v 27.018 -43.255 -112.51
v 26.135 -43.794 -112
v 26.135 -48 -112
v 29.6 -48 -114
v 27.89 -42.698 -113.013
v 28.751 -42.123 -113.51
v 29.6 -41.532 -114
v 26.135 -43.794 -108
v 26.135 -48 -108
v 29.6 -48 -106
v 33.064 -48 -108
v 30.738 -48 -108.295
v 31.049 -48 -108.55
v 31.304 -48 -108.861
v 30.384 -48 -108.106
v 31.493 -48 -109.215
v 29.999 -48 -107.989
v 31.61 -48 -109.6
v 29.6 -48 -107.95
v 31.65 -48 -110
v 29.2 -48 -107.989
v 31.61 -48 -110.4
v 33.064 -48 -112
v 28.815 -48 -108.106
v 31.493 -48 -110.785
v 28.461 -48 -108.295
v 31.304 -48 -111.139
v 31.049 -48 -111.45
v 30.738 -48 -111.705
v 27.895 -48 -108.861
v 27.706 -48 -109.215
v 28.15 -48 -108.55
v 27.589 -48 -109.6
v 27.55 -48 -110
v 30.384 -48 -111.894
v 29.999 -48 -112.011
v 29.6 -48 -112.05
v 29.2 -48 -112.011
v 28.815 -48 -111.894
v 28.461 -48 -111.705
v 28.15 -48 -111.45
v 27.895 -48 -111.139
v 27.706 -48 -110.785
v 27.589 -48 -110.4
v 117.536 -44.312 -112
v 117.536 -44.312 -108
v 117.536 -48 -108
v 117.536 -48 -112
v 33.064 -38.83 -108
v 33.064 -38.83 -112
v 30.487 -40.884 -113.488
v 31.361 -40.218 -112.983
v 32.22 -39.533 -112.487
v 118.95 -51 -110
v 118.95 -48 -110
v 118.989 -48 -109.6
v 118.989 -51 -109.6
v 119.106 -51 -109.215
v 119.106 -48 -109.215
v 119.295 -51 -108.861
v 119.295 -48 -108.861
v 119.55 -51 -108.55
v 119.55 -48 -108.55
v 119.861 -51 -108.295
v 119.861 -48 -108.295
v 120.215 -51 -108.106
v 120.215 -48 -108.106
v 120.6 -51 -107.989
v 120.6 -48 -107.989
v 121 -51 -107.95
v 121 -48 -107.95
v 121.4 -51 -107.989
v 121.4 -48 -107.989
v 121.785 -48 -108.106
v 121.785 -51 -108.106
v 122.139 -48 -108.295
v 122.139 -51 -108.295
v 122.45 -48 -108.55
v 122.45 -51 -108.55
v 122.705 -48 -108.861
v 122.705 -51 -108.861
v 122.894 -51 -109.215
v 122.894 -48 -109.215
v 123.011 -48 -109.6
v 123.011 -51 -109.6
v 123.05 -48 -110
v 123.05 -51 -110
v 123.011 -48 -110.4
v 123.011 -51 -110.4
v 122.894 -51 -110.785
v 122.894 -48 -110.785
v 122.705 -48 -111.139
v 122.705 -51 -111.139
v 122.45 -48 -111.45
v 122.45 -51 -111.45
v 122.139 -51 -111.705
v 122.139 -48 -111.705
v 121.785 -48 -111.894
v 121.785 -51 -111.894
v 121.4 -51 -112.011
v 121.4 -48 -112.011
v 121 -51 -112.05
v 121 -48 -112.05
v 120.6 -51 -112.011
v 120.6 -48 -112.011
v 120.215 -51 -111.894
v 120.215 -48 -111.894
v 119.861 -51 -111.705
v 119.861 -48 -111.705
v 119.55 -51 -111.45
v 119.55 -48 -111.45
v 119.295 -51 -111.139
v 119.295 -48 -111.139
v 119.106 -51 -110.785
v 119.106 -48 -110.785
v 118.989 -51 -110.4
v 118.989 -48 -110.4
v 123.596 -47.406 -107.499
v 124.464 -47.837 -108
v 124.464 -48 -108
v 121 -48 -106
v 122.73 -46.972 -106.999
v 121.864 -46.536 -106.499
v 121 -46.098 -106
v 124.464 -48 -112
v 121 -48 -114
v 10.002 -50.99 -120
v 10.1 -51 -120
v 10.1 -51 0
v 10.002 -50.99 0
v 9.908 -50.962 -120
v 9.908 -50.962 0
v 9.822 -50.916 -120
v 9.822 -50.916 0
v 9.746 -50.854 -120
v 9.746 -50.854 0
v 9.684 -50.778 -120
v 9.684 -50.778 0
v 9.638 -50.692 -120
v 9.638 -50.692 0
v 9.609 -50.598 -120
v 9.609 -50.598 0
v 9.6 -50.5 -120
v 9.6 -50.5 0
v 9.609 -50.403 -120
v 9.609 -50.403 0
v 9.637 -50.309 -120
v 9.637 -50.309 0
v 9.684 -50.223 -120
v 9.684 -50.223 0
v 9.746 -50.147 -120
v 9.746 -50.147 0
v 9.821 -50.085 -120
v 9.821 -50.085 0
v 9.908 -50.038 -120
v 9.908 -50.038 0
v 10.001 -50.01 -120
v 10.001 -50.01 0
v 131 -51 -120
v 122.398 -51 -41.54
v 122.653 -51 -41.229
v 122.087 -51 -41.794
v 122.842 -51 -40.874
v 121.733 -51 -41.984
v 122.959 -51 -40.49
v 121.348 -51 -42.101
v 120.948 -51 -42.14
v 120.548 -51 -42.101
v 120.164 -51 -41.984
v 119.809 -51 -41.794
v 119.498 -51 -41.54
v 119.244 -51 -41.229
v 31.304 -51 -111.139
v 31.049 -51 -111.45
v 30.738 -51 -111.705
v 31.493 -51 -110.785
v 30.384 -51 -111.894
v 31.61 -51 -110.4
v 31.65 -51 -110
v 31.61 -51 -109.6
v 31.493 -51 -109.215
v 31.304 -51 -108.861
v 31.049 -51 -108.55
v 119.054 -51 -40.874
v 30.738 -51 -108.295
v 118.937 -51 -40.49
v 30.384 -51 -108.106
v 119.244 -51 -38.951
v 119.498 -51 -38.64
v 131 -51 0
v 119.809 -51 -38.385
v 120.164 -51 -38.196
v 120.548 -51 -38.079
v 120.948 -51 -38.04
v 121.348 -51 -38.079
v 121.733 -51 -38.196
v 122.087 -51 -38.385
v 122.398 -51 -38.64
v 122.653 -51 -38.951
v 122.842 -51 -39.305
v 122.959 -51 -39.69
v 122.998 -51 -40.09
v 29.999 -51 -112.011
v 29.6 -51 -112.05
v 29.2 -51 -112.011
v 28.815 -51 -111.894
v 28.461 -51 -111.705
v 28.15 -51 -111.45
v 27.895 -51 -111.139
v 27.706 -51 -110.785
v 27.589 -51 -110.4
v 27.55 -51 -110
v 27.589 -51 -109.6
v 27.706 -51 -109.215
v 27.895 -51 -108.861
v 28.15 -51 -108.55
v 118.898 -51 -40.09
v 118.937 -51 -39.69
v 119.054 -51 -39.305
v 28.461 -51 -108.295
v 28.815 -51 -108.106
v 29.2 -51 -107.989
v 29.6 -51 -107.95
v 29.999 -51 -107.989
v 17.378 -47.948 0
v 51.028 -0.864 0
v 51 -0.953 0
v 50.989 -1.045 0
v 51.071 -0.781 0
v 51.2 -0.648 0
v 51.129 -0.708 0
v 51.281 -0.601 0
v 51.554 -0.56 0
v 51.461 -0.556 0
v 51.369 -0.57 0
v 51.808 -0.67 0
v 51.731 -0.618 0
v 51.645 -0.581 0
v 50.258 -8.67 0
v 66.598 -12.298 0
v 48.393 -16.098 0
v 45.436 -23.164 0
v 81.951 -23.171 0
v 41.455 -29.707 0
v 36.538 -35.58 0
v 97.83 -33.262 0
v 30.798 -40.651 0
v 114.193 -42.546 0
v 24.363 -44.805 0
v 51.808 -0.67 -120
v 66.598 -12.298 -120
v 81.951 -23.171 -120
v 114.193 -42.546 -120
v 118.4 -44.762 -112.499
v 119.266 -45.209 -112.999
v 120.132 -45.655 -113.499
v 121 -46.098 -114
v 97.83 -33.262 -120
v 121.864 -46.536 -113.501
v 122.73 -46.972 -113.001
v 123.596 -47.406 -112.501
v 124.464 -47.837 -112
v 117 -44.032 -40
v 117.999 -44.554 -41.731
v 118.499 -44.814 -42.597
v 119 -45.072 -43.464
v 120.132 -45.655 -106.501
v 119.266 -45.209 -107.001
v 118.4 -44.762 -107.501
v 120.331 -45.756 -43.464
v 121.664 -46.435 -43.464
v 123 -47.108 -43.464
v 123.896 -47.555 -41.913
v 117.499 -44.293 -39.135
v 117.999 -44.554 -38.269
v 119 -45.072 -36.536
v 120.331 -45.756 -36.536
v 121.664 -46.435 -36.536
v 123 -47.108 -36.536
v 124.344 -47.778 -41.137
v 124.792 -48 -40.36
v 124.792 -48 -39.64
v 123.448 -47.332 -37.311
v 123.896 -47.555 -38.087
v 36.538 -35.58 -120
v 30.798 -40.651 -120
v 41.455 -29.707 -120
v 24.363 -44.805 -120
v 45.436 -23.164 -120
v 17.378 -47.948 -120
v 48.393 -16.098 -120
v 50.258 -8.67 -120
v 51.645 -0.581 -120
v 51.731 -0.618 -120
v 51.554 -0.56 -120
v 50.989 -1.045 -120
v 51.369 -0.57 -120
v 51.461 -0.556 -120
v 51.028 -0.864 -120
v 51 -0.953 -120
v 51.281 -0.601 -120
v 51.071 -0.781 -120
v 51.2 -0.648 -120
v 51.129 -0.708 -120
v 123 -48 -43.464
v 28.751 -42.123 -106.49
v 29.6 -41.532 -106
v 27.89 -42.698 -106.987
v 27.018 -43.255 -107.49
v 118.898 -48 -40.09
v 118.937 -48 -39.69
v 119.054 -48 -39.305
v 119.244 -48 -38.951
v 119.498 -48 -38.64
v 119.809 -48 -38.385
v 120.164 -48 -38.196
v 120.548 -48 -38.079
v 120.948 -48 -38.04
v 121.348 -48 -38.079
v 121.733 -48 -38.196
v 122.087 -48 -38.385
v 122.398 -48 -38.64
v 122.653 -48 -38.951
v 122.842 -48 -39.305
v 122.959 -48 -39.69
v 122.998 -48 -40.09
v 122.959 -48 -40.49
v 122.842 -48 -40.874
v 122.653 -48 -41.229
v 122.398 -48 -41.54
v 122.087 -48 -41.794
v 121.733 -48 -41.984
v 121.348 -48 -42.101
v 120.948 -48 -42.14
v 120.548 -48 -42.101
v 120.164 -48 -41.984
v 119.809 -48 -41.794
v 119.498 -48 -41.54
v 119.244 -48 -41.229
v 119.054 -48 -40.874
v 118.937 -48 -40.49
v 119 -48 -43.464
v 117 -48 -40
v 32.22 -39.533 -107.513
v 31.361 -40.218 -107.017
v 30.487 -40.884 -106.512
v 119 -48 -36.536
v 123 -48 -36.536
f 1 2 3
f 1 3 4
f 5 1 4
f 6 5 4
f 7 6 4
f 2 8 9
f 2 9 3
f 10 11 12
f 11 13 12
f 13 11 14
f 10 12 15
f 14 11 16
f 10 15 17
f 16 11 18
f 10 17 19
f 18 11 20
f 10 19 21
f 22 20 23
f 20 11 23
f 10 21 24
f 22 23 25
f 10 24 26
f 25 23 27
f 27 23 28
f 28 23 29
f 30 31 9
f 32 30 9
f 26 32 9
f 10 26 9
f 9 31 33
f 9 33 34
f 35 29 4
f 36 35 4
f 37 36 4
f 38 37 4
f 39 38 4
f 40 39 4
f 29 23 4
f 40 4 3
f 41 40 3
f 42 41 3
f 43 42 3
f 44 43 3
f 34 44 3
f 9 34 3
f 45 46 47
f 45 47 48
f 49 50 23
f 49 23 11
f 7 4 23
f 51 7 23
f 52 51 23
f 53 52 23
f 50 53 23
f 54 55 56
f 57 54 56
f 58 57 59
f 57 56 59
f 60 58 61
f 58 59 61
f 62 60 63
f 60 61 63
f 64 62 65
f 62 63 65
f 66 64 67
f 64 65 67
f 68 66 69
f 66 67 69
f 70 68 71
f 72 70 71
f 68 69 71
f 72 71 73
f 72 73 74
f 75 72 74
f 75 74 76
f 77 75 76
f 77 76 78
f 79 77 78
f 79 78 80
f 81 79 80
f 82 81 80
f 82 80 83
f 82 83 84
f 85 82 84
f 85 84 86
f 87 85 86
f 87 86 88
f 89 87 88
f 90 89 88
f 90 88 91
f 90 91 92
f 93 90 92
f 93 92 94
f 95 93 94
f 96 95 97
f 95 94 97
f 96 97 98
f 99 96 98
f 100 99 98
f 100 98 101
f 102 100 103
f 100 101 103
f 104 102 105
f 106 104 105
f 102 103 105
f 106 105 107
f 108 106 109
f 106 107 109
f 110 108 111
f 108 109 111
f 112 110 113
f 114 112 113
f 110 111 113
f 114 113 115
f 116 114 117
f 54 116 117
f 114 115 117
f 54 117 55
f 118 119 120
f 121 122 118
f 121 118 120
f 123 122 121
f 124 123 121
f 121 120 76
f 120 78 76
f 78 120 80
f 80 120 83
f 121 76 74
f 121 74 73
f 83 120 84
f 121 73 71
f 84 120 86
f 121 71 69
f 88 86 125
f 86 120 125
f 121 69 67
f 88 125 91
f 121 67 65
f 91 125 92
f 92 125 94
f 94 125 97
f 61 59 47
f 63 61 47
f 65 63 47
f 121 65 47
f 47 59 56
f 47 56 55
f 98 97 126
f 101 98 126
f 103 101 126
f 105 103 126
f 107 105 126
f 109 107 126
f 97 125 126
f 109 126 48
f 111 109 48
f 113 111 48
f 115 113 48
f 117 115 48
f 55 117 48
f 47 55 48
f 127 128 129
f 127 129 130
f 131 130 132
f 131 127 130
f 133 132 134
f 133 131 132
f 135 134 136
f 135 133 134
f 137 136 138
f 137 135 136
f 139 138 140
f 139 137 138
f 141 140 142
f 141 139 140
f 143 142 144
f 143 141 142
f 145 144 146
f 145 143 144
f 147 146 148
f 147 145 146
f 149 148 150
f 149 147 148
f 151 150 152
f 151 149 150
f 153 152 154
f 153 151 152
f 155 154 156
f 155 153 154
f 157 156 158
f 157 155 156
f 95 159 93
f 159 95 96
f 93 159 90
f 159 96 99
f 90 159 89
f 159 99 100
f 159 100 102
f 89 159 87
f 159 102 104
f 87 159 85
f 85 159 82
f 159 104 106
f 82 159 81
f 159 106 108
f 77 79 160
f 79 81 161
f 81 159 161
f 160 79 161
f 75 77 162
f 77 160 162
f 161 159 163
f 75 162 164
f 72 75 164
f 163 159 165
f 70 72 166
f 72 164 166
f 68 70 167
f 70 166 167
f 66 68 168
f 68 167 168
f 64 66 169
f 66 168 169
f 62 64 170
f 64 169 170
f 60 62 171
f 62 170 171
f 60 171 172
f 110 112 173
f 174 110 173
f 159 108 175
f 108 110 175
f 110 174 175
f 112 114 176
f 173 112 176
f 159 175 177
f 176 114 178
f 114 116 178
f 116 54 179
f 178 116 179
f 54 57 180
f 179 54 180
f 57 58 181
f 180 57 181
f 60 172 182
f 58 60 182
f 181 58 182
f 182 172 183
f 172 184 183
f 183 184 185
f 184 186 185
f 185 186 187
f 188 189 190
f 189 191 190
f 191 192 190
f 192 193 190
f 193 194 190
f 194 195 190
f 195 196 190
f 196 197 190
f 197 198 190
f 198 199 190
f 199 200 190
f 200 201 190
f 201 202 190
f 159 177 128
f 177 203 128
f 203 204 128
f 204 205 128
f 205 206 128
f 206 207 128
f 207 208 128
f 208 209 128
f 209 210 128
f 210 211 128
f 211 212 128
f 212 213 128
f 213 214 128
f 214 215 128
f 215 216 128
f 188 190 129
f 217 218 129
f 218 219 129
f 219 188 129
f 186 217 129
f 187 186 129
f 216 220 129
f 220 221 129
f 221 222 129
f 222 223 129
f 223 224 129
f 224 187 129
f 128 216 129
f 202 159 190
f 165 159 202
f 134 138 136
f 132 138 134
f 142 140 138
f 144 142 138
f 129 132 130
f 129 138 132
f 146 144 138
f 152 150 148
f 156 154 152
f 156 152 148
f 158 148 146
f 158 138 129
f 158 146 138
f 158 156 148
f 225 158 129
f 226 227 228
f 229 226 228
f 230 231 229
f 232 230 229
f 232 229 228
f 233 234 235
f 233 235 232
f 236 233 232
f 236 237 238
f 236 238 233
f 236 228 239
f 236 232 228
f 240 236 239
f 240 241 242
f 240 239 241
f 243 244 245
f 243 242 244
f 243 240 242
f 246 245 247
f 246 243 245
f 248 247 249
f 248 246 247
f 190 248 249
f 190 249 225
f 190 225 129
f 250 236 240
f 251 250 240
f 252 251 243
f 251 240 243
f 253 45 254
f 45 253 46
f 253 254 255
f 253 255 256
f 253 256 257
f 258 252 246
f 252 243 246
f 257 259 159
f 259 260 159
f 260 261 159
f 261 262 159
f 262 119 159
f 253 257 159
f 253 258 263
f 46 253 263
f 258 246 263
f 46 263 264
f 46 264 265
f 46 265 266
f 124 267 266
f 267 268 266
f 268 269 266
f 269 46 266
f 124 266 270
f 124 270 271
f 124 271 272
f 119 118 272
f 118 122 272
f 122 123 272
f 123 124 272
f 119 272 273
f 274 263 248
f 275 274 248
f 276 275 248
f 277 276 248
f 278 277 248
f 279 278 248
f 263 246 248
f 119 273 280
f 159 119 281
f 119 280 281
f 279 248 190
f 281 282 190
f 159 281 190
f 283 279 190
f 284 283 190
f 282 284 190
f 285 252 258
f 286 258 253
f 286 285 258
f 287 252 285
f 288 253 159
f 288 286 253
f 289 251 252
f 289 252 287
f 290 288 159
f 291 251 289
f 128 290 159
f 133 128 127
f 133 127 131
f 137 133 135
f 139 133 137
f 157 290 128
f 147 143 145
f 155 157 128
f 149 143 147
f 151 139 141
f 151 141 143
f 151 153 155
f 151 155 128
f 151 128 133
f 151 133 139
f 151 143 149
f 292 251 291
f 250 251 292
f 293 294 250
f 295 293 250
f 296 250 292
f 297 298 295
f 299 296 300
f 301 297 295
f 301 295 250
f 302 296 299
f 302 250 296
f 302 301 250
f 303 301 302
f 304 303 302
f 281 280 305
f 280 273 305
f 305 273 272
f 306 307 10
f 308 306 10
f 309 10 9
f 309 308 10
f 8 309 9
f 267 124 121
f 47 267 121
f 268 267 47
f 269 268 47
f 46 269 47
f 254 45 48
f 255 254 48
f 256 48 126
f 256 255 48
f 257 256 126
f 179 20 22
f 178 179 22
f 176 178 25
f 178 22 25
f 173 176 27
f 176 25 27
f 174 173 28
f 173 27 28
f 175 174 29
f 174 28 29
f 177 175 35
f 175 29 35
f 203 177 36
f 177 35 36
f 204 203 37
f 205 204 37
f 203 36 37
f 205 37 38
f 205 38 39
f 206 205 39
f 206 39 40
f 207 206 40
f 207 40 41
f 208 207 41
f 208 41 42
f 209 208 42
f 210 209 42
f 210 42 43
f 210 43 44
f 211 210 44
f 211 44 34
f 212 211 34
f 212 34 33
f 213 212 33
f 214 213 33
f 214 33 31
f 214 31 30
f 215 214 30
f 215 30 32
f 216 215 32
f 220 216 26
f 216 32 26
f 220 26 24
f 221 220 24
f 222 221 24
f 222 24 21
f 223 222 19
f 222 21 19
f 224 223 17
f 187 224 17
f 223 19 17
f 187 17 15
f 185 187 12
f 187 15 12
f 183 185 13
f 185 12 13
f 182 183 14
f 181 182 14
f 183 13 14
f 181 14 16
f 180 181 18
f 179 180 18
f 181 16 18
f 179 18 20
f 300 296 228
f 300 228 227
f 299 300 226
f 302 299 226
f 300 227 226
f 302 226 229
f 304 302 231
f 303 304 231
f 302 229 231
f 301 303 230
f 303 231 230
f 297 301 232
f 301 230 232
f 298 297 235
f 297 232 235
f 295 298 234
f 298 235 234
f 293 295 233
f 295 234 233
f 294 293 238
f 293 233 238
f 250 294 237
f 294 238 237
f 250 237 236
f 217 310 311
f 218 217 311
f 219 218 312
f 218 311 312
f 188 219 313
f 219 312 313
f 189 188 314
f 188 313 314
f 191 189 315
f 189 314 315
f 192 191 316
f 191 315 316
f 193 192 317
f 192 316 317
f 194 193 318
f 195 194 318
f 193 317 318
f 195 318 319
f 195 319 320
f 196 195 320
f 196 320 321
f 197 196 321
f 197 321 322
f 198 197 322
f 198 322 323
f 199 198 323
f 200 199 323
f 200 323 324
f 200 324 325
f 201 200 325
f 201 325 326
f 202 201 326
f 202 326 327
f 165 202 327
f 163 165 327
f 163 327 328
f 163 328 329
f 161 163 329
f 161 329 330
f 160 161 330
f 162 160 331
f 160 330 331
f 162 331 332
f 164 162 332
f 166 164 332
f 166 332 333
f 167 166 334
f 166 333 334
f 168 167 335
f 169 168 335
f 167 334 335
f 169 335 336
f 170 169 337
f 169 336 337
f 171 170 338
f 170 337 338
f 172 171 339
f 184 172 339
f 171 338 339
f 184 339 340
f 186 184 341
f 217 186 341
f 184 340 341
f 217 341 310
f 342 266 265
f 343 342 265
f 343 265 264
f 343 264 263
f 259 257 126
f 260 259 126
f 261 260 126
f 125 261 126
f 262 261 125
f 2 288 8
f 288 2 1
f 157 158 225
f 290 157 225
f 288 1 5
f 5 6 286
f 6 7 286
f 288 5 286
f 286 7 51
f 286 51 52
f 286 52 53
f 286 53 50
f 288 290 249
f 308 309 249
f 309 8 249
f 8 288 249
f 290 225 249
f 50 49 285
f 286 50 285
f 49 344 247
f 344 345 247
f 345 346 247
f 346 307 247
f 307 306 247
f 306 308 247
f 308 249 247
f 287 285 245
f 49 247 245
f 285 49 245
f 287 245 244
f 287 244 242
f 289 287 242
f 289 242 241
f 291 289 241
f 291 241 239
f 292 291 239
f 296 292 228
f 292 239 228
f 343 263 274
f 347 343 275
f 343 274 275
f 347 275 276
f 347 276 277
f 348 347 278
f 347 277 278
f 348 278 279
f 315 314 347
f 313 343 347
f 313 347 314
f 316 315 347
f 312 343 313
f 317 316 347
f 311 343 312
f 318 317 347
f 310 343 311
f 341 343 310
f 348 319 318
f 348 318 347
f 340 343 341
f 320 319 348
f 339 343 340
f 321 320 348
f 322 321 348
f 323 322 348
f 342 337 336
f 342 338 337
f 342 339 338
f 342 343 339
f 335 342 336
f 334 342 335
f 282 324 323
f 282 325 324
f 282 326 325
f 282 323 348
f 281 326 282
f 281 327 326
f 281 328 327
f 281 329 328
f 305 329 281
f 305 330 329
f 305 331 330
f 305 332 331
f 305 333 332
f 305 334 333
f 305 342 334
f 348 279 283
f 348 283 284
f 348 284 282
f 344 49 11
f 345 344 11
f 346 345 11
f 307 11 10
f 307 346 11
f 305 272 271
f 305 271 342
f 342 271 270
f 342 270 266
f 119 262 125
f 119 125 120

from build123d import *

# Parameters (mm, degrees)
EXTRUDE_1_DEPTH     = 120
FILLET_1_R          = 0.5
CUT_EXTRUDE_1_DEPTH = 48
SKETCH_5_R          = 2.0500000000000123
SKETCH_5_R_2        = 2.0500000000000056
SKETCH_5_R_3        = 2.0499999999999923
CUT_EXTRUDE_2_DEPTH = 5
SKETCH_6_R          = 70.99685128536404
CUT_EXTRUDE_3_DEPTH = 185.82965146426048


with BuildPart() as part:
    # 草图3 → 凸台-拉伸1 (new, symmetric)
    with BuildSketch(Plane.XY):
        with BuildLine():
            Line((131, -50.99999999999999), (6.25e-15, -51))
            ThreePointArc((6.25e-15, -51), (36.062445840513924, -36.062445840513924), (51, 0))
            ThreePointArc((51, 0), (89.3844868048509, -28.034138345331712), (131, -50.99999999999999))
        make_face()
    extrude(amount=EXTRUDE_1_DEPTH, both=True)

    # 圆角1
    fillet_1_edges = [part.edges().sort_by_distance(p)[0] for p in [
        (50.99999999999999, -2.664e-14, 0),
        (6.25e-15, -51, 0),
    ]]
    fillet(fillet_1_edges, radius=FILLET_1_R)

    # 草图4 → 切除-拉伸1 (cut)
    with BuildSketch(Plane(origin=(0, 0, 0), x_dir=(1, 0, 0), z_dir=(0, 1, 0))):
        Polygon((124.4641016151378, -112), (124.4641016151378, -108), (121.00000000000006, -106.00000000000001), (117.5358983848623, -108), (117.5358983848623, -112), (121.00000000000004, -113.99999999999999), align=None)
        Polygon((29.599504938362088, -106.00000000000001), (26.135403323224345, -108.00000000000001), (26.135403323224345, -112), (29.599504938362088, -113.99999999999999), (33.06360655349983, -112), (33.06360655349983, -108.00000000000001), align=None)
        Polygon((33.06360655349983, 108.00000000000001), (29.599504938362088, 106.00000000000001), (26.135403323224345, 108.00000000000001), (26.135403323224345, 112), (29.599504938362088, 113.99999999999999), (33.06360655349983, 112), align=None)
        Polygon((121.00000000000004, 113.99999999999999), (124.4641016151378, 112), (124.4641016151378, 108), (121.00000000000006, 106.00000000000001), (117.5358983848623, 108), (117.5358983848623, 112), align=None)
        Polygon((123.00000000000004, -36.53589838486225), (119.00000000000006, -36.53589838486225), (117.00000000000004, -39.99999999999999), (119.00000000000004, -43.46410161513774), (123.00000000000003, -43.46410161513774), (125.00000000000006, -39.99999999999999), align=None)
        Polygon((125.00000000000003, 40.00000000000008), (123.00000000000001, 43.464101615137785), (119.00000000000001, 43.464101615137785), (116.99999999999999, 40), (118.99999999999997, 36.535898384862286), (123.00000000000006, 36.535898384862286), align=None)
    extrude(amount=-CUT_EXTRUDE_1_DEPTH, mode=Mode.SUBTRACT)

    # 草图5 → 切除-拉伸2 (cut)
    with BuildSketch(Plane(origin=(2.54e-15, -47.99999999999999, 0), x_dir=(1, 5e-17, 0), z_dir=(-5e-17, 1, 0))):
        with Locations(Location((29.599504938362074, -110.00000000000001, 0), (0, 0, 180))):
            Circle(SKETCH_5_R)
        with Locations((29.599504938362074, 110.00000000000001)):
            Circle(SKETCH_5_R)
        with Locations(Location((121, 110.00000000000001, 0), (0, 0, 180))):
            Circle(SKETCH_5_R_2)
        with Locations((121.00000000000006, -110)):
            Circle(SKETCH_5_R_2)
        with Locations(Location((120.94806034143625, 40.089962127560234, 0), (0, 0, 180))):
            Circle(SKETCH_5_R_3)
        with Locations(Location((121.00000000000006, -40, 0), (0, 0, 180))):
            Circle(SKETCH_5_R_3)
    extrude(amount=-CUT_EXTRUDE_2_DEPTH, mode=Mode.SUBTRACT)

    # 草图6 → 切除-拉伸3 (cut, through all)
    with BuildSketch(Plane.XY):
        with Locations((70.54975246918104, -50.99999999999999)):
            Circle(SKETCH_6_R)
    extrude(amount=CUT_EXTRUDE_3_DEPTH, mode=Mode.SUBTRACT)


solid = part.part
